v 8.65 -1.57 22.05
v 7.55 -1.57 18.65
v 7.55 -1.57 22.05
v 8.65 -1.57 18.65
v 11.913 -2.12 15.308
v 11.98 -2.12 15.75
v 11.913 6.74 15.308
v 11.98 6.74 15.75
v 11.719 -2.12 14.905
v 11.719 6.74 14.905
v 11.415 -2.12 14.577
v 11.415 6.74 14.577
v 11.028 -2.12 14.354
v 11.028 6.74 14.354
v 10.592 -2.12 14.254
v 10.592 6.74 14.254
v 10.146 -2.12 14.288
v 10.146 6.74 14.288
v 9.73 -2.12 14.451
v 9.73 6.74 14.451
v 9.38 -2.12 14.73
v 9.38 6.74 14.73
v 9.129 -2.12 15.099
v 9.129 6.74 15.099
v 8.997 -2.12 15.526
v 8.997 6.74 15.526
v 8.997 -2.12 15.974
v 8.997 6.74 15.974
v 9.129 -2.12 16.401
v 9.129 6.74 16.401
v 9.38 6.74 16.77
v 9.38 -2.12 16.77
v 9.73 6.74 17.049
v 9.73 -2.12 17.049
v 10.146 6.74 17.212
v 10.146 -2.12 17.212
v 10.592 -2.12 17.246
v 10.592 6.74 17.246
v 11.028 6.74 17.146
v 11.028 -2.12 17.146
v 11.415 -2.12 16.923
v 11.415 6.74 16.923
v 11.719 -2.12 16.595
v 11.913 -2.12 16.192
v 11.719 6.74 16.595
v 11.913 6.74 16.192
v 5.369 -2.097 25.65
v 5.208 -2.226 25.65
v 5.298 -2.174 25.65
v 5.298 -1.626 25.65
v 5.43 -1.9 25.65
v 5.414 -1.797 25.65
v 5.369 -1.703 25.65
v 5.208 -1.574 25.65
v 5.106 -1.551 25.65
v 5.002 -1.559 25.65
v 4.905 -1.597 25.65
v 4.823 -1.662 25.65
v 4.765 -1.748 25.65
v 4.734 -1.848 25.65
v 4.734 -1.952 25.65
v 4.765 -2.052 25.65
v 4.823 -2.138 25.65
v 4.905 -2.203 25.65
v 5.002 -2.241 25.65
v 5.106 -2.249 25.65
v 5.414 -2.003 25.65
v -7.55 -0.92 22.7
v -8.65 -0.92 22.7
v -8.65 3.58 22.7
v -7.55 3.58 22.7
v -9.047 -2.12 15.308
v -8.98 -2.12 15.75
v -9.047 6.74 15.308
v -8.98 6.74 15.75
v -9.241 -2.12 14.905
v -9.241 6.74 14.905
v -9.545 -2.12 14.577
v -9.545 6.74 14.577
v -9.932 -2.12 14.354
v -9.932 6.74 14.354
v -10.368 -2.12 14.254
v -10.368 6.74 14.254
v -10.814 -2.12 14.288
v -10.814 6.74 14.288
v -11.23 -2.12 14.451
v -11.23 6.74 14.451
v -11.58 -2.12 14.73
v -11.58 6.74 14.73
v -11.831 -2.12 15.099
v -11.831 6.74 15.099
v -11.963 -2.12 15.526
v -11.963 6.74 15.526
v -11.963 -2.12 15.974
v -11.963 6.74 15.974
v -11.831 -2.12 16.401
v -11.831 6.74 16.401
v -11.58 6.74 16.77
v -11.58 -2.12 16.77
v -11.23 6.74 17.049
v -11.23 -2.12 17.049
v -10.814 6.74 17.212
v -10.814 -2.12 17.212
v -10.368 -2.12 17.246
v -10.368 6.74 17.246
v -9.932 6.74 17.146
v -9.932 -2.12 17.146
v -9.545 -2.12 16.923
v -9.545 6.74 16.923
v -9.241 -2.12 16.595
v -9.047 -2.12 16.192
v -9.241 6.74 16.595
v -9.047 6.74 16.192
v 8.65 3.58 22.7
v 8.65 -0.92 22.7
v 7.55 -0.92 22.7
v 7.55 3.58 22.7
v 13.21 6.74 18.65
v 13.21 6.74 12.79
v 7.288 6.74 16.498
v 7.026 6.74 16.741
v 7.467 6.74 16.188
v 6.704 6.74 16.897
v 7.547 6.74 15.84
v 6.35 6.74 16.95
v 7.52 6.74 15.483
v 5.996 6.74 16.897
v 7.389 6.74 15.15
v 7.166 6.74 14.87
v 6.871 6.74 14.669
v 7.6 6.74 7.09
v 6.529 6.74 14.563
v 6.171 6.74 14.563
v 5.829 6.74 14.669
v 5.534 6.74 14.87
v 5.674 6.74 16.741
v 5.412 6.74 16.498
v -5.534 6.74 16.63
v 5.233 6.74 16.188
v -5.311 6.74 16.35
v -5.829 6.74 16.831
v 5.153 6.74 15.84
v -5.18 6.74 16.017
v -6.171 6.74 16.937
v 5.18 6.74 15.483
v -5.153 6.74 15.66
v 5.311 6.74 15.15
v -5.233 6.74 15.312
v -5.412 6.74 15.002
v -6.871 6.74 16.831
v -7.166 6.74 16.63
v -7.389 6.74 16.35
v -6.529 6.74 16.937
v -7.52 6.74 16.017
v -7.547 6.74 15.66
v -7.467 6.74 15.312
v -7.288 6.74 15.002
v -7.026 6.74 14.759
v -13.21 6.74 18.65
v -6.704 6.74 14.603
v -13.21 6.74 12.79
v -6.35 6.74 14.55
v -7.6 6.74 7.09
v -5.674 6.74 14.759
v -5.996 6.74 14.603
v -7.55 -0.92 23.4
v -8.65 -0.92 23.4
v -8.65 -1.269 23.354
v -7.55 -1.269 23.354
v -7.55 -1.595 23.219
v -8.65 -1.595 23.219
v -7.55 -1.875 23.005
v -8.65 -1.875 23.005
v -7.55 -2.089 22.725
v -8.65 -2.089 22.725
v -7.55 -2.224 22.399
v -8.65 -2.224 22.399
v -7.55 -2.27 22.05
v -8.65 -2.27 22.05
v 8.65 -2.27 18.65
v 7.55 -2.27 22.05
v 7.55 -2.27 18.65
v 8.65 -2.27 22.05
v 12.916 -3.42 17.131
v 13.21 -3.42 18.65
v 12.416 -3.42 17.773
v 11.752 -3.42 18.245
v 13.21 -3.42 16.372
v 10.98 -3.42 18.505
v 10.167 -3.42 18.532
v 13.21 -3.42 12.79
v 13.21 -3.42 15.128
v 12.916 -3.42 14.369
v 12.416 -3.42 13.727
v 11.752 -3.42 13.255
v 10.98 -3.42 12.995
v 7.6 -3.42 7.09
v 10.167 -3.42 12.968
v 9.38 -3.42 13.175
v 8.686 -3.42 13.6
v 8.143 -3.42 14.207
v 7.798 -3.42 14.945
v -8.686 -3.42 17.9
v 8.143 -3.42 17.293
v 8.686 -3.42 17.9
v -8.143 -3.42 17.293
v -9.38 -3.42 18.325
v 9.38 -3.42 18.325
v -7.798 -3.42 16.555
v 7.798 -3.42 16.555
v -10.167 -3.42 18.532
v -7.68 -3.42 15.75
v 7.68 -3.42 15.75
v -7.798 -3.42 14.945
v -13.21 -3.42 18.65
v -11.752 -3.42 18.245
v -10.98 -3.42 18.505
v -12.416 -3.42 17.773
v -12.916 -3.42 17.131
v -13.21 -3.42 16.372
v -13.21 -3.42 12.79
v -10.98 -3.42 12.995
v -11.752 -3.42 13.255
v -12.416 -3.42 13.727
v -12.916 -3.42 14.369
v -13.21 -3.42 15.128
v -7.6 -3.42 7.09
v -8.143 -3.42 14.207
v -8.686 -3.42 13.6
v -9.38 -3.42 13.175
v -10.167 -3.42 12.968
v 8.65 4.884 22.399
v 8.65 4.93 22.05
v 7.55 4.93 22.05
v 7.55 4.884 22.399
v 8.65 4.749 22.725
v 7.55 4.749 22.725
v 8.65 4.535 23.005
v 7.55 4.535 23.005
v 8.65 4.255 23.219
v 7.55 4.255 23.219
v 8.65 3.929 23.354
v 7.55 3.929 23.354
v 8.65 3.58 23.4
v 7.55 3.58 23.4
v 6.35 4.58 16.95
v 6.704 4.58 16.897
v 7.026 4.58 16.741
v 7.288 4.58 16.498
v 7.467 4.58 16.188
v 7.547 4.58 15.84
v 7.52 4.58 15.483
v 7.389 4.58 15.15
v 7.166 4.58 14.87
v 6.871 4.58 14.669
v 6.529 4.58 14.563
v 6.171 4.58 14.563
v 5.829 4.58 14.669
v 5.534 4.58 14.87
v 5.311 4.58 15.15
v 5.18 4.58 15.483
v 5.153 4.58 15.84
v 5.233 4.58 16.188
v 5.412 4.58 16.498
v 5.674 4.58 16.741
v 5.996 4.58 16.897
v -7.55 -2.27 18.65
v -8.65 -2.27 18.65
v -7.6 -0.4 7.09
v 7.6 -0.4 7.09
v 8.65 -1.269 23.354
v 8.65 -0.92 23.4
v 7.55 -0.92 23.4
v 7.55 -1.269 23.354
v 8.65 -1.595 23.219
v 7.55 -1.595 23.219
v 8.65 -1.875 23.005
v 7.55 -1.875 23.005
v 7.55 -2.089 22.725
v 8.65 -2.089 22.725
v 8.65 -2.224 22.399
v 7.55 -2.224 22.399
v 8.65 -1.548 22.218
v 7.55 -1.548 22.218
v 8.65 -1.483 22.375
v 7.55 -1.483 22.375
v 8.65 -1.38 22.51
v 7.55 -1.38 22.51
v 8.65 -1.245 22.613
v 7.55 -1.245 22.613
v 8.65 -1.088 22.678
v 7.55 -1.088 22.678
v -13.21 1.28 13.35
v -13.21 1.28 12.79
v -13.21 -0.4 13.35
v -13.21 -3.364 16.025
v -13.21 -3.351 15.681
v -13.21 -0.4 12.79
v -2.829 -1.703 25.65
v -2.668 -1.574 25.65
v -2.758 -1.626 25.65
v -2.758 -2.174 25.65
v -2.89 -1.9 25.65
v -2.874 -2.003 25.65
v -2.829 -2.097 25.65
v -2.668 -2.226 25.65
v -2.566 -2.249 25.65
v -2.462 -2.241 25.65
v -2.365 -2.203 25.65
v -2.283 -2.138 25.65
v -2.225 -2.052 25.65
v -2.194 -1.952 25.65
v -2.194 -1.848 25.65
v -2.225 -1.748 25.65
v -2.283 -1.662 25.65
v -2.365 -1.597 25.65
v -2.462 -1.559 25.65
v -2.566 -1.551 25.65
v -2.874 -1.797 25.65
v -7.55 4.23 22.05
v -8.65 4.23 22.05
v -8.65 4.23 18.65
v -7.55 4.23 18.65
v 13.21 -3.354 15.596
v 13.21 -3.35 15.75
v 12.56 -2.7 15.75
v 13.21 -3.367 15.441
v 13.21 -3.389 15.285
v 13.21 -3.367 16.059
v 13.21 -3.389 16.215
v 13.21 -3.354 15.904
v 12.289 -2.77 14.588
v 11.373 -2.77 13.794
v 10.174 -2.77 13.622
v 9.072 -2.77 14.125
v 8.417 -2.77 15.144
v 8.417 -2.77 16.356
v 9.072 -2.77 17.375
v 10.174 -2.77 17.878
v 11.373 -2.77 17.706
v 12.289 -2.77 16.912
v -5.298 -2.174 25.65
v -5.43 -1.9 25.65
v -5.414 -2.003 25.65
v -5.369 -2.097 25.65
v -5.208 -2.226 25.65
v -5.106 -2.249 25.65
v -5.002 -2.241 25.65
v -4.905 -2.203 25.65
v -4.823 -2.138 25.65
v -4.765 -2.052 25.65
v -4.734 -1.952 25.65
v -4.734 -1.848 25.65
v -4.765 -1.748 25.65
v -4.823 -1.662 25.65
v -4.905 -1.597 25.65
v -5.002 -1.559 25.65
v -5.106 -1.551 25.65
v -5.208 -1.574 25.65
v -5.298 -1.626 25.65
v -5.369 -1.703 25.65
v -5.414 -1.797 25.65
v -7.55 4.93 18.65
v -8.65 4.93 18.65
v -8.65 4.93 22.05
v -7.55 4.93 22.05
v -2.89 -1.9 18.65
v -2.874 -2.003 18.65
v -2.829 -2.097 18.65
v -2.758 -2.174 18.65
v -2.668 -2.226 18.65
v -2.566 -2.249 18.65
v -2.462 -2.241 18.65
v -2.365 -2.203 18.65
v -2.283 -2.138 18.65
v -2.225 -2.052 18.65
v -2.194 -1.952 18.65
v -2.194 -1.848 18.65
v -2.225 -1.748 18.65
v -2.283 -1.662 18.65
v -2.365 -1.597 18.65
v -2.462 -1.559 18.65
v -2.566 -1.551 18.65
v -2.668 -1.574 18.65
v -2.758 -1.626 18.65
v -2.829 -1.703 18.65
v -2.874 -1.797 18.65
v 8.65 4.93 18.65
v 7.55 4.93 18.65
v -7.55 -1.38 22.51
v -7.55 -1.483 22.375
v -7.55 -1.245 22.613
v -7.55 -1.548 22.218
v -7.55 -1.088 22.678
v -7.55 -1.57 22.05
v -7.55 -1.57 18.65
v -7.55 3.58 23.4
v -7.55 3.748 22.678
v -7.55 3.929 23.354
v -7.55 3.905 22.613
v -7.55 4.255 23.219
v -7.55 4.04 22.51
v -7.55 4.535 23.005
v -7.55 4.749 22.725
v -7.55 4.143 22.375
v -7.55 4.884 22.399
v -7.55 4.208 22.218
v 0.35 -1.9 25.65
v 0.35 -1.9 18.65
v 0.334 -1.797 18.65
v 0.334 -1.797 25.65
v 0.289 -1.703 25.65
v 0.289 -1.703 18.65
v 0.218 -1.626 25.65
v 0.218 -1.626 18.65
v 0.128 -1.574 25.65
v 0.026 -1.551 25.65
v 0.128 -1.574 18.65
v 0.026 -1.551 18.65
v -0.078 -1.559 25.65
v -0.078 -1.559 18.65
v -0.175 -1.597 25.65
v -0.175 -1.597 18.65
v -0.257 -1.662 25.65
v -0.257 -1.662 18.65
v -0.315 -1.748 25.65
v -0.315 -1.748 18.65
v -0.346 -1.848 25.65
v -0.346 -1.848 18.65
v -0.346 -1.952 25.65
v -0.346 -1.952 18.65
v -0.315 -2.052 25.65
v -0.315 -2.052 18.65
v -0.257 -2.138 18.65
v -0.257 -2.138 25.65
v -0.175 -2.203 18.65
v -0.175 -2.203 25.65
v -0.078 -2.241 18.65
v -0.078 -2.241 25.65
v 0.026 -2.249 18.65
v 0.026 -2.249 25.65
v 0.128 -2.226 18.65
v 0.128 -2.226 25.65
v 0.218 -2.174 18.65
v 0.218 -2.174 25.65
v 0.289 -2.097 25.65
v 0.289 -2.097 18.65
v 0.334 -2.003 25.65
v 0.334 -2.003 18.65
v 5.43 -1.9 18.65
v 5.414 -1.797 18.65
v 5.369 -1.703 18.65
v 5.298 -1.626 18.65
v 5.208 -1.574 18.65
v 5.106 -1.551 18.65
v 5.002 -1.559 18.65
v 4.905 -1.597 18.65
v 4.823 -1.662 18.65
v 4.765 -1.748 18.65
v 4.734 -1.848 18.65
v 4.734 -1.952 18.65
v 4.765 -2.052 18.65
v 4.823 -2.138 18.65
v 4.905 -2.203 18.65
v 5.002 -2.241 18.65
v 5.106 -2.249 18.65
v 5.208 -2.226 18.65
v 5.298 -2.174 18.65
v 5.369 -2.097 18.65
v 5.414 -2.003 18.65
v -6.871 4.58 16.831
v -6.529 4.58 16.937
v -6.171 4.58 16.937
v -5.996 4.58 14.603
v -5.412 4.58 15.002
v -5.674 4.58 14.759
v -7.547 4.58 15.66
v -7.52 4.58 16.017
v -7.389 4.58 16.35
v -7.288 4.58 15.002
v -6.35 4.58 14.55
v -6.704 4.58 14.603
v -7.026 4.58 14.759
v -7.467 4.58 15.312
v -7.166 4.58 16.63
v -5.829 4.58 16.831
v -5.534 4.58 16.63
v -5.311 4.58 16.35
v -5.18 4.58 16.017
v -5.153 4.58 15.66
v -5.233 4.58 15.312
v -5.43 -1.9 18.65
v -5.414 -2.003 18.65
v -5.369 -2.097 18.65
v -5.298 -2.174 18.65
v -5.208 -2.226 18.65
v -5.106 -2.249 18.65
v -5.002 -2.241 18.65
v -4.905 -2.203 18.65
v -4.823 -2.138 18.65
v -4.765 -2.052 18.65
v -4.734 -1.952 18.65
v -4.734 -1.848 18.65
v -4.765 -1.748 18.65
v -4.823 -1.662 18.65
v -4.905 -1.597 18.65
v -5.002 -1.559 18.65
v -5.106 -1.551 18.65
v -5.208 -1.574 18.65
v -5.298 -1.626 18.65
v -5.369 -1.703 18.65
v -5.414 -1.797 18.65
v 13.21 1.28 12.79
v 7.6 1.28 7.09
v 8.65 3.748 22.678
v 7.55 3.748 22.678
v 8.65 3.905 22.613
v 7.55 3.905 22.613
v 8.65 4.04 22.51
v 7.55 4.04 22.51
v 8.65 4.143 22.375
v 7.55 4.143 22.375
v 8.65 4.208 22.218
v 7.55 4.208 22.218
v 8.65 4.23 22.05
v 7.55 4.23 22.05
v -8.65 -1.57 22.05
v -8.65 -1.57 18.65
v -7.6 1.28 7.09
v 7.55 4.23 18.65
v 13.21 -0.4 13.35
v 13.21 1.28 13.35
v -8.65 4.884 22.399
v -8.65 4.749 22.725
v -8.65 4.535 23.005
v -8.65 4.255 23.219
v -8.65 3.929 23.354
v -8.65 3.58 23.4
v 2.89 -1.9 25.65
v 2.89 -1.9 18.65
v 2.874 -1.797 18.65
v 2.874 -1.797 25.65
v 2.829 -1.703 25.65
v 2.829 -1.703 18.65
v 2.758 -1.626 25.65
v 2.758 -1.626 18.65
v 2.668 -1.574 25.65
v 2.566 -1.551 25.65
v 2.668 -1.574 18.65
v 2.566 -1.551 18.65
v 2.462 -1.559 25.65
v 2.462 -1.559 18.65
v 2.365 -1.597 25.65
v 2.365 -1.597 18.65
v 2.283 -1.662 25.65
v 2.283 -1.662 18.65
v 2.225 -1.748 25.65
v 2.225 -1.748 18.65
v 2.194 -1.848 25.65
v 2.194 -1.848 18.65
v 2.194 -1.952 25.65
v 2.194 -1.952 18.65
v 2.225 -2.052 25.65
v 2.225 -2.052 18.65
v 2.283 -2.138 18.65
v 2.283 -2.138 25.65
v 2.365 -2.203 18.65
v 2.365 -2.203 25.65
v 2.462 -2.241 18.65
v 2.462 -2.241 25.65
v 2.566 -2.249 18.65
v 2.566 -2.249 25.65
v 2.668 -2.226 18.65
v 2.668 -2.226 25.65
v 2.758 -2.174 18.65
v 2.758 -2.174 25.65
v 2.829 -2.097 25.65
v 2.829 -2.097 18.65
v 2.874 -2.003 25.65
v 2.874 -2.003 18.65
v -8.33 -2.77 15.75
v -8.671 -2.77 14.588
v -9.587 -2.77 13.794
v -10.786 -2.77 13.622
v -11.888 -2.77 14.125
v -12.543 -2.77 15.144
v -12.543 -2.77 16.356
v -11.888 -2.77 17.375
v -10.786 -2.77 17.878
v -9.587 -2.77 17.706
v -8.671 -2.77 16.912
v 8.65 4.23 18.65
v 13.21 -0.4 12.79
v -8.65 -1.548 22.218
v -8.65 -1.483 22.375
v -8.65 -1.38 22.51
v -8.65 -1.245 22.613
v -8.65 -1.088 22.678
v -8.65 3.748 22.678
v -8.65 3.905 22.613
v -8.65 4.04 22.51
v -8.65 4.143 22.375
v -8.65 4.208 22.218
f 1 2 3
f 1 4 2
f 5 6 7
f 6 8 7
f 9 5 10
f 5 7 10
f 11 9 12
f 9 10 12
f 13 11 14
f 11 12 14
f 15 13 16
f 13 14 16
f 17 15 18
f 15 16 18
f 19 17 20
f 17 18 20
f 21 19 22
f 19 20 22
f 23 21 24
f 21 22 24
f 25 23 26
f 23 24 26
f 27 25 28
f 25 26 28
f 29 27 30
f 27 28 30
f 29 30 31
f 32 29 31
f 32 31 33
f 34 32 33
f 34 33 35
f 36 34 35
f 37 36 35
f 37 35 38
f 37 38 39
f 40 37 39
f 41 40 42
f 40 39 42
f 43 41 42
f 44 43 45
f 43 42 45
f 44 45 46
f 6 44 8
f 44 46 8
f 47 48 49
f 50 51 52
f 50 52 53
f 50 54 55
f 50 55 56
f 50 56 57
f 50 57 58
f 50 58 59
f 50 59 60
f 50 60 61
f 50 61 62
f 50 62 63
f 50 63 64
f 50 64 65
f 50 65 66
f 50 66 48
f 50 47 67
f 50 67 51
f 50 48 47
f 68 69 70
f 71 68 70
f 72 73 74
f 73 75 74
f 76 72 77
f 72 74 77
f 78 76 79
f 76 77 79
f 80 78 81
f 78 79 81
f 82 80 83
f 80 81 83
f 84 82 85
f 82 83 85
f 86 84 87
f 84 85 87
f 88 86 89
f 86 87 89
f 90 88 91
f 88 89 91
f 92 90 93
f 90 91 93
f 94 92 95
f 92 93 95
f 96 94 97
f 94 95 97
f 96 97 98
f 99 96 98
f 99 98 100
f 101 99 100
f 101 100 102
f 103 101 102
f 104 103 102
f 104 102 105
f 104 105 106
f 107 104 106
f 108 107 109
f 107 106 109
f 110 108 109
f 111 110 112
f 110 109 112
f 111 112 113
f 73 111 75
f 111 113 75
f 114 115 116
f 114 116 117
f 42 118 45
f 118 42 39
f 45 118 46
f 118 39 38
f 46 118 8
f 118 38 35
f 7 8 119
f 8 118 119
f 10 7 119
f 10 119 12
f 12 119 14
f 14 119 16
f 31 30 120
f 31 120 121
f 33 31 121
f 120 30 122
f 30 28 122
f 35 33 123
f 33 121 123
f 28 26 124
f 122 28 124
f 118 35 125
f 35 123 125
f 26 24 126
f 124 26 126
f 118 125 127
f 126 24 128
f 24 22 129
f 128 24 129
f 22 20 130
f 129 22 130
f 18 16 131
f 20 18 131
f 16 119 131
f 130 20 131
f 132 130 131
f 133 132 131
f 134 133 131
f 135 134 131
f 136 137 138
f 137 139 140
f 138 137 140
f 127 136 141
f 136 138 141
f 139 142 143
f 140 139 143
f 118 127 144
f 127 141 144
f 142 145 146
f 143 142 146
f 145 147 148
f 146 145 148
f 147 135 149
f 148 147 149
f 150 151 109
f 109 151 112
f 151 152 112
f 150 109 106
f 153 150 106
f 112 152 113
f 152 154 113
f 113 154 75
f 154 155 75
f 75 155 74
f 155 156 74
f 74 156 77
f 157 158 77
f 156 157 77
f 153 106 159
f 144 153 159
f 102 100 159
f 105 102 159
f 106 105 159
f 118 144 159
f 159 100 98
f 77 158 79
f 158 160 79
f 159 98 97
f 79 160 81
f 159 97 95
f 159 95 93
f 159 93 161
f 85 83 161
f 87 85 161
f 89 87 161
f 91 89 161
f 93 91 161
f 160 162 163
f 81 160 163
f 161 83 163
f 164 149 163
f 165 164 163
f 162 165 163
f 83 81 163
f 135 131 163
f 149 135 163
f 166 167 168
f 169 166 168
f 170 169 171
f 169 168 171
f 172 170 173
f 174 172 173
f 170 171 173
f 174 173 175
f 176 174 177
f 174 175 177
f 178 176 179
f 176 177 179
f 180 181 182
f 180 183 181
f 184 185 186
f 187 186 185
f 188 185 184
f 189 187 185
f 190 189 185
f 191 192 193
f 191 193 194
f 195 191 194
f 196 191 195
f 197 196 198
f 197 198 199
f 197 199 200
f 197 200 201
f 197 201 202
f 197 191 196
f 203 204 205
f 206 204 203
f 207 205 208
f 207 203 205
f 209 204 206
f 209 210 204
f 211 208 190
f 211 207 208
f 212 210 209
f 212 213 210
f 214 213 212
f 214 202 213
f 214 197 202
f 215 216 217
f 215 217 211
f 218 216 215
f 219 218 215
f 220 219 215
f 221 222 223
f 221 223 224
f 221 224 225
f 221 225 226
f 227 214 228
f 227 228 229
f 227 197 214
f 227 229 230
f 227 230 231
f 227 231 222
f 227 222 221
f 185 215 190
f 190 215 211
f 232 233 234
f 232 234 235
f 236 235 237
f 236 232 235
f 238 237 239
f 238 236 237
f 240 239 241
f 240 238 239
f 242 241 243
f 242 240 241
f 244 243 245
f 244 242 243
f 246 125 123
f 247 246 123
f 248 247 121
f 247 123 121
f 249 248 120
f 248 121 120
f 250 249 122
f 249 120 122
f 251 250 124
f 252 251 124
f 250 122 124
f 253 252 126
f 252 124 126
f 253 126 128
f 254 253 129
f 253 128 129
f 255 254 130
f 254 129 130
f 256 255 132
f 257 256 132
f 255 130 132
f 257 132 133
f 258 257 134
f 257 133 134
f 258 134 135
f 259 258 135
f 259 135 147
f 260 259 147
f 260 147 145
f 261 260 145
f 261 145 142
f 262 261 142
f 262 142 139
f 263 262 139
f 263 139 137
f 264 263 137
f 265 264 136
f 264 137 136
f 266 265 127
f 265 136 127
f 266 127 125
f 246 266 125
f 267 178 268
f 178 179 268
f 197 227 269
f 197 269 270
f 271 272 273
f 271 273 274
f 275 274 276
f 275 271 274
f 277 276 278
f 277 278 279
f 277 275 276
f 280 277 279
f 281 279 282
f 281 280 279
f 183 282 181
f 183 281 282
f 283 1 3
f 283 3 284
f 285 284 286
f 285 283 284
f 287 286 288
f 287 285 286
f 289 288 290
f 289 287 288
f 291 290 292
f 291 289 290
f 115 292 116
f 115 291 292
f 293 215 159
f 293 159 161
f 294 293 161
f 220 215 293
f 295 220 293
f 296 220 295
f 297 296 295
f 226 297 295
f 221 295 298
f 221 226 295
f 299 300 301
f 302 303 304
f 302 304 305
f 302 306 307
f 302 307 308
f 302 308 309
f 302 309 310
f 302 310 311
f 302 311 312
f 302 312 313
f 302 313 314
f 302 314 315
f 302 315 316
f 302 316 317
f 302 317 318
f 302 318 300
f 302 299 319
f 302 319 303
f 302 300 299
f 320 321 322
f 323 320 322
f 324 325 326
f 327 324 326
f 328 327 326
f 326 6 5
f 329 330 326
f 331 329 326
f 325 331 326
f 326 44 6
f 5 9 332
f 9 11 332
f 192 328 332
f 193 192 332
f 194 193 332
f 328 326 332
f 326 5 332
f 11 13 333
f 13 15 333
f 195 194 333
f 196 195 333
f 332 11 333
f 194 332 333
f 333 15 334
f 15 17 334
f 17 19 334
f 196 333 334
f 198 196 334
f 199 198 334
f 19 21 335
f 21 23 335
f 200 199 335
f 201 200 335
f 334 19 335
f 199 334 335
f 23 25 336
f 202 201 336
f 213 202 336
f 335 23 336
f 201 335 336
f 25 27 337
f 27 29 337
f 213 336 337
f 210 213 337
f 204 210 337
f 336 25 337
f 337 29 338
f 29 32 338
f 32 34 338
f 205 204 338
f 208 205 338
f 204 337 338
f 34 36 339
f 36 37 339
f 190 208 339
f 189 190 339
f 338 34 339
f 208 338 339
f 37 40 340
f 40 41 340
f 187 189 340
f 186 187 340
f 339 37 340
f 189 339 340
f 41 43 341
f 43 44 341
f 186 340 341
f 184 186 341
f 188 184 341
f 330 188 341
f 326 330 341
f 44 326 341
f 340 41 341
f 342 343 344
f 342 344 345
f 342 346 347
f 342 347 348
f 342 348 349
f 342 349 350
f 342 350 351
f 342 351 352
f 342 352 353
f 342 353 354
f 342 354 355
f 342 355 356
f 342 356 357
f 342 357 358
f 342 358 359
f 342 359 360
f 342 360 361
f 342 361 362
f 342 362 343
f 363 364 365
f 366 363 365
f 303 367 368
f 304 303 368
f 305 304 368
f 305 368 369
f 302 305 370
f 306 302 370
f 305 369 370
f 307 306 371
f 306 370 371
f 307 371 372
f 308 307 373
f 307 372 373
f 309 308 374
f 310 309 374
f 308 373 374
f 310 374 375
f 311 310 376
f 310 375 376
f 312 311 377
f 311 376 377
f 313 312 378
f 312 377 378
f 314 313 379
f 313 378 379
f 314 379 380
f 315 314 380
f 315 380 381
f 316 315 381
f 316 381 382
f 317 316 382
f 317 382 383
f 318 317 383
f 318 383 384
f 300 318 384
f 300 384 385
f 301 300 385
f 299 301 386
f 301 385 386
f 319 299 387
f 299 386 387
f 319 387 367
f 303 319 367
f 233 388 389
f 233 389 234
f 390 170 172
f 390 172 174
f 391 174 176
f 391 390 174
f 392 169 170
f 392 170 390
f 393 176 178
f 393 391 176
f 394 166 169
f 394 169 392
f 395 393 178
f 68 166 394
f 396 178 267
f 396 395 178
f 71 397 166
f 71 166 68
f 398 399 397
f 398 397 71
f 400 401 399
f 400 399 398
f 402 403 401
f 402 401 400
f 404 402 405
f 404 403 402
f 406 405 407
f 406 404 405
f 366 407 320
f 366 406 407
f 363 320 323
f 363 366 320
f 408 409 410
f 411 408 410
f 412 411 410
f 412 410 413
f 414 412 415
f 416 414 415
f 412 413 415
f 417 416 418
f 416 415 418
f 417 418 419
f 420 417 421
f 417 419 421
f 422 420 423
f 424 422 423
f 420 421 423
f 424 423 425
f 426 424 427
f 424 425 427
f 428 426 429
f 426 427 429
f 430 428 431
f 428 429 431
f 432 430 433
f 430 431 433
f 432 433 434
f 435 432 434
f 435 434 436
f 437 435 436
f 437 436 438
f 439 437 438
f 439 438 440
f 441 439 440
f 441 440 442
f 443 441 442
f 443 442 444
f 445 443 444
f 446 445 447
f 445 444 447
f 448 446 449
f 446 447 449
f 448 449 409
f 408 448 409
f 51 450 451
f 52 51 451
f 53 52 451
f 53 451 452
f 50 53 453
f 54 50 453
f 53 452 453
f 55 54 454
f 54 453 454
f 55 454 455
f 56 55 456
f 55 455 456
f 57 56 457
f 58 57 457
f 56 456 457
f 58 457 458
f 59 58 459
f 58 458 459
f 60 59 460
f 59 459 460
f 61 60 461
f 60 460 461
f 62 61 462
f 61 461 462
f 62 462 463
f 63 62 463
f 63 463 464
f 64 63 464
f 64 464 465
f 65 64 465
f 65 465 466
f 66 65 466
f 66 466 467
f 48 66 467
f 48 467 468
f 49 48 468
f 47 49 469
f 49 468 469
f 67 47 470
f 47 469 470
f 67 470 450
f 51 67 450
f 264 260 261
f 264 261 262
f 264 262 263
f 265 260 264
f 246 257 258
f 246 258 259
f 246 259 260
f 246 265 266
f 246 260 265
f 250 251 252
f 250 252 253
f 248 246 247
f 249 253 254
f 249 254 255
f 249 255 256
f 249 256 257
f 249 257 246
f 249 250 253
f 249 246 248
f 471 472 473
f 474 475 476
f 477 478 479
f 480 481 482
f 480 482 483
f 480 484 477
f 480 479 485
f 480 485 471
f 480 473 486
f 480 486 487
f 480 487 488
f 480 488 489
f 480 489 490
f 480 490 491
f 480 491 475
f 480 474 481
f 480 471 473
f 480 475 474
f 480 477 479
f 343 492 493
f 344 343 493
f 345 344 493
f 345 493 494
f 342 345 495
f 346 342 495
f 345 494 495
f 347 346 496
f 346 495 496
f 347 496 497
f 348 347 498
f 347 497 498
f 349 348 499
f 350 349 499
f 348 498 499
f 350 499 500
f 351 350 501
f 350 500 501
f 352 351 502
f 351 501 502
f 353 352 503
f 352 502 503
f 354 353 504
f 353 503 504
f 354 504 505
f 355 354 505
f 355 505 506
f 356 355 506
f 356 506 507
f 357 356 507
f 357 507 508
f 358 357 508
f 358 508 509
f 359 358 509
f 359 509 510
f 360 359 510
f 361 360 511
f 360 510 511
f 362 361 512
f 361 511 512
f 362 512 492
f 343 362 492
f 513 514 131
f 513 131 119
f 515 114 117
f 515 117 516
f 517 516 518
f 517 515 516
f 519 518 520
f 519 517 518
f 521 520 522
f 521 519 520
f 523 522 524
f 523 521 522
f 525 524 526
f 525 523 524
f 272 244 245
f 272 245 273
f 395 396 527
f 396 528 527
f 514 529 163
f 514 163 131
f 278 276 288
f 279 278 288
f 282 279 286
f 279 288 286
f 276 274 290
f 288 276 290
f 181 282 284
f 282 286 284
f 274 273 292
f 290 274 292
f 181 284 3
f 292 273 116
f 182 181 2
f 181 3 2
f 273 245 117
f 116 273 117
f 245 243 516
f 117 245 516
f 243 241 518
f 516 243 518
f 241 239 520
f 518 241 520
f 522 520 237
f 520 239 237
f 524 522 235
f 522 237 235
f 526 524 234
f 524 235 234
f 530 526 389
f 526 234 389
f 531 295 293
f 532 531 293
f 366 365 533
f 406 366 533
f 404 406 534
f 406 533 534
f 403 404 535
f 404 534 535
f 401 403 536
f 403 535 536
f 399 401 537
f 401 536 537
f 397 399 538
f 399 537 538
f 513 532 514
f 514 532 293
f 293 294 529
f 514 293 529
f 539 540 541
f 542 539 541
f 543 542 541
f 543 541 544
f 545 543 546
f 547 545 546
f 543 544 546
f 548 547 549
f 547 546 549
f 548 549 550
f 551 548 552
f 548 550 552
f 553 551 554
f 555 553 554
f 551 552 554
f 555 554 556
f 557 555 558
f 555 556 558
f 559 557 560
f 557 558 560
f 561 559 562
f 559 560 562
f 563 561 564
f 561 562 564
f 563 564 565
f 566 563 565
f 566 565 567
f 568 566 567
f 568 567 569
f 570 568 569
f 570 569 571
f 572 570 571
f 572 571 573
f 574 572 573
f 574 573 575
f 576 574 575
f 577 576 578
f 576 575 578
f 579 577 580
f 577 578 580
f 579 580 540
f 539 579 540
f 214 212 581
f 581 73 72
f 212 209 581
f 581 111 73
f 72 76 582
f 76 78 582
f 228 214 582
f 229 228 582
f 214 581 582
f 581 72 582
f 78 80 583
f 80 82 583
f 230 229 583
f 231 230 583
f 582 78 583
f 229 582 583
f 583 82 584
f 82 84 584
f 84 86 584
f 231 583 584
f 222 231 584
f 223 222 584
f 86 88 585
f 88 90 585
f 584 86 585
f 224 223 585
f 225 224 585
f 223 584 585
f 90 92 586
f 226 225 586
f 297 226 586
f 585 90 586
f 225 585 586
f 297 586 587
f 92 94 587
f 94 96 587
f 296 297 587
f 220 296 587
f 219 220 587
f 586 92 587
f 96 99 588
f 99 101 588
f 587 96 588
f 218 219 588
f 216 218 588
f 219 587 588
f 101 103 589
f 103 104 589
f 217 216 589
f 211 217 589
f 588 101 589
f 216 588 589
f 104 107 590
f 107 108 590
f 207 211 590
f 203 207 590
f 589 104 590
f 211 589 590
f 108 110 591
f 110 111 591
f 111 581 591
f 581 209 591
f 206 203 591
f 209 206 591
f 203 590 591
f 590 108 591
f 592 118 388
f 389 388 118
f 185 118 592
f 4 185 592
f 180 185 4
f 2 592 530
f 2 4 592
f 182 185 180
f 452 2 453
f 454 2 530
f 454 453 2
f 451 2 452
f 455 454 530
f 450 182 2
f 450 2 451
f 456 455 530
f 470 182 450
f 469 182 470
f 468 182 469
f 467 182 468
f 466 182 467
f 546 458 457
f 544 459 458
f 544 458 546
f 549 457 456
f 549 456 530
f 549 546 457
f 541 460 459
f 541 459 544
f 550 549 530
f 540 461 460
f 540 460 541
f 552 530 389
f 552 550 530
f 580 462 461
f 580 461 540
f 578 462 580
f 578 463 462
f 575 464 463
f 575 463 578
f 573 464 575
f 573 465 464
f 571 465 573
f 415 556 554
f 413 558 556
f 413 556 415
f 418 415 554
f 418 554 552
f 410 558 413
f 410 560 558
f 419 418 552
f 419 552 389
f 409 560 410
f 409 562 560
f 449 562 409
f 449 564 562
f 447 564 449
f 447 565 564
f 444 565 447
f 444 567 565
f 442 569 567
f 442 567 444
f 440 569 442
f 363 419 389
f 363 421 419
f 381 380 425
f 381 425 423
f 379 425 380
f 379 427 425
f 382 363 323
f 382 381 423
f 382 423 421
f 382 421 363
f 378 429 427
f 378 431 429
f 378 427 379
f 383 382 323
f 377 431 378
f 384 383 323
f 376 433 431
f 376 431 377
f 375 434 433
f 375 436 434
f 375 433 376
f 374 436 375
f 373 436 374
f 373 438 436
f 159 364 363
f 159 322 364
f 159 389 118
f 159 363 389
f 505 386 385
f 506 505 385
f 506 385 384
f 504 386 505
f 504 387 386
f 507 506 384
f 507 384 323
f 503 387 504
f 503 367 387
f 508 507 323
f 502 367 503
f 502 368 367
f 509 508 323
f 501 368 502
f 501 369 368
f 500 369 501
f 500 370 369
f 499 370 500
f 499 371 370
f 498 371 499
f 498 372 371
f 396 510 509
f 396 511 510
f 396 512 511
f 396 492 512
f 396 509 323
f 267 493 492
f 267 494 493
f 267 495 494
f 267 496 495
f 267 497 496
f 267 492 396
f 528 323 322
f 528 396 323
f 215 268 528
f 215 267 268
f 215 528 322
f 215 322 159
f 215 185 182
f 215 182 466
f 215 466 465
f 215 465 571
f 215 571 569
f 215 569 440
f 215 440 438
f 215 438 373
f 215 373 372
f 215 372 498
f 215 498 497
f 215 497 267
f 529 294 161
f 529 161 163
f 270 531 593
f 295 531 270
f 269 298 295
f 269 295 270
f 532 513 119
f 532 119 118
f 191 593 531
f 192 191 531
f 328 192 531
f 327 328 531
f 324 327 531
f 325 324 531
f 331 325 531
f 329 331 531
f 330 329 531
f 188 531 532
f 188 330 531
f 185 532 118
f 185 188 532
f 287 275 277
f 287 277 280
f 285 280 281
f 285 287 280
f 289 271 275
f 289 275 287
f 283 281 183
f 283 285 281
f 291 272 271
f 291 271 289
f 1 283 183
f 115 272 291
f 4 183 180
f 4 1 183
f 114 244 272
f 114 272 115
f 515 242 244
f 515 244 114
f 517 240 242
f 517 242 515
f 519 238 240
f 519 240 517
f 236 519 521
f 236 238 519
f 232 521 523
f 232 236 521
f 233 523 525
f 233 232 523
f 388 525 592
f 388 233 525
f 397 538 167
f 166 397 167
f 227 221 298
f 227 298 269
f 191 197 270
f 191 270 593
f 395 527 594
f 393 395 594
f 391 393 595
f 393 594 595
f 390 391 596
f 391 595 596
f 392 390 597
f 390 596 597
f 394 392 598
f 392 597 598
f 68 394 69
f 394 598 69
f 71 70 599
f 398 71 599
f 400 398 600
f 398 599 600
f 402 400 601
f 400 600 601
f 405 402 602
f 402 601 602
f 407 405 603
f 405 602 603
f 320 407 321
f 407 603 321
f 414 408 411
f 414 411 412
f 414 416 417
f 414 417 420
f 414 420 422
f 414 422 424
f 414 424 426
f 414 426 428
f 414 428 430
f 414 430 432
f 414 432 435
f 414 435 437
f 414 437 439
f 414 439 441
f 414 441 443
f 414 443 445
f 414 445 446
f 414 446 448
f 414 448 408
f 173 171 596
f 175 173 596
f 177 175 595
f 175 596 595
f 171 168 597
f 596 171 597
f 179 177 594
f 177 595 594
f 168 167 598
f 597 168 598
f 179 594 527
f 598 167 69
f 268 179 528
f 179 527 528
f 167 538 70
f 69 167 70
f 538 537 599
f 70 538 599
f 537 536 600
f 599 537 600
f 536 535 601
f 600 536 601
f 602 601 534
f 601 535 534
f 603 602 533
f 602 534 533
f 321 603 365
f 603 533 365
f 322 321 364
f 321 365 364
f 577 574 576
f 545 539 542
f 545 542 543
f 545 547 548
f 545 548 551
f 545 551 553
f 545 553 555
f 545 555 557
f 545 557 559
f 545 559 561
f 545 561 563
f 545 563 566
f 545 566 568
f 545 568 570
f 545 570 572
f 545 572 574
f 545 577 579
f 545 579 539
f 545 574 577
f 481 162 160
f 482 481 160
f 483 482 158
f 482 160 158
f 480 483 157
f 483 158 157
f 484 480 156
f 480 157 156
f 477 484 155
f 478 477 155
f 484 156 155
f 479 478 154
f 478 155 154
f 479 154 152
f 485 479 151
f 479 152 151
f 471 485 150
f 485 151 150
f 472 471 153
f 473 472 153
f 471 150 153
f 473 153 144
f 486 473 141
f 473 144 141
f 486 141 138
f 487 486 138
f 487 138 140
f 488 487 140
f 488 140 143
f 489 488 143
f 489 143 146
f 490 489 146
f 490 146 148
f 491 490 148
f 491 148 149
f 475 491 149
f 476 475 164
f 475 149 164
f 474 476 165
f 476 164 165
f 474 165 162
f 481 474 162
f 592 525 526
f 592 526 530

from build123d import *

# Parameters (mm, degrees)
AUFSATZ_LINEAR_AUSTRAGEN1_DEPTH                      = 6.74
AUFSATZ_LINEAR_AUSTRAGEN1_DEPTH_BACK                 = 3.42
SKIZZE1_R                                            = 1.385
SCHNITT_LINEAR_AUSTRAGEN1_DEPTH                      = 24.827593248
SCHNITT_LINEAR_AUSTRAGEN1_DEPTH_BACK                 = 24.827593248
SKIZZE2_W                                            = 16.035180953
SKIZZE2_H                                            = 1.68
SKIZZE3_R                                            = 1.2
SCHNITT_LINEAR_AUSTRAGEN2_DEPTH                      = 2.16
SKIZZE4_R                                            = 0.35
AUFSATZ_LINEAR_AUSTRAGEN2_DEPTH                      = 7
LINEAR_AUSTRAGEN_D_NN1_DEPTH                         = 0.55
FORMSENKUNG_F_R_M3_SENKSCHRAUBE_MIT_SCHL_D           = 3
FORMSENKUNG_F_R_M3_SENKSCHRAUBE_MIT_SCHL_DEPTH       = 11
FORMSENKUNG_F_R_M3_SENKSCHRAUBE_MIT_SCHL_CSINK_D     = 5.6
FORMSENKUNG_F_R_M3_SENKSCHRAUBE_MIT_SCHL_CSINK_ANGLE = 90
FORMSENKUNG_F_R_M3_SENKSCHRAUBE_MIT_SCHL_TIP         = 0.901290929


with BuildPart() as part:
    # Skizze1 → Aufsatz-Linear austragen1 (new, two sides: drawn at the far end of the back side and taken through both)
    with BuildSketch(Plane(origin=(0, 0, 0), x_dir=(1, 0, 0), z_dir=(0, 1, 0)).offset(-AUFSATZ_LINEAR_AUSTRAGEN1_DEPTH_BACK)):
        Polygon((-13.21, -18.65), (-13.21, -12.79), (-7.6, -7.09), (7.6, -7.09), (13.21, -12.79), (13.21, -18.65), align=None)
        with Locations((-10.48, -15.75)):
            Circle(SKIZZE1_R, mode=Mode.SUBTRACT)
        with Locations((10.48, -15.75)):
            Circle(SKIZZE1_R, mode=Mode.SUBTRACT)
    extrude(amount=AUFSATZ_LINEAR_AUSTRAGEN1_DEPTH + AUFSATZ_LINEAR_AUSTRAGEN1_DEPTH_BACK)

    # Skizze2 → Schnitt-Linear austragen1 (cut, two sides: drawn at the far end of the back side and taken through both)
    with BuildSketch(Plane(origin=(0, 0, 0), x_dir=(0, 0, -1), z_dir=(1, 0, 0)).offset(-SCHNITT_LINEAR_AUSTRAGEN1_DEPTH_BACK)):
        with Locations((-5.332409524, 0.44)):
            Rectangle(SKIZZE2_W, SKIZZE2_H)
    extrude(amount=SCHNITT_LINEAR_AUSTRAGEN1_DEPTH + SCHNITT_LINEAR_AUSTRAGEN1_DEPTH_BACK, mode=Mode.SUBTRACT)

    # Skizze3 → Schnitt-Linear austragen2 (cut)
    with BuildSketch(Plane(origin=(0, 6.74, 0), x_dir=(1, 0, 0), z_dir=(0, 1, 0))):
        with Locations((6.35, -15.75)):
            Circle(SKIZZE3_R)
        with Locations((-6.35, -15.75)):
            Circle(SKIZZE3_R)
    extrude(amount=-SCHNITT_LINEAR_AUSTRAGEN2_DEPTH, mode=Mode.SUBTRACT)

    # Skizze4 → Aufsatz-Linear austragen2 (add)
    with BuildSketch(Plane.XY.offset(18.65)):
        with Locations((0, -1.9)):
            Circle(SKIZZE4_R)
        with Locations((2.54, -1.9)):
            Circle(SKIZZE4_R)
        with Locations((5.08, -1.9)):
            Circle(SKIZZE4_R)
        with Locations((-2.54, -1.9)):
            Circle(SKIZZE4_R)
        with Locations((-5.08, -1.9)):
            Circle(SKIZZE4_R)
    extrude(amount=AUFSATZ_LINEAR_AUSTRAGEN2_DEPTH)

    # Skizze5 → Linear-Austragen-Dünn1 (add, symmetric)
    with BuildSketch(Plane(origin=(8.1, 0, 0), x_dir=(0, 0, -1), z_dir=(1, 0, 0))):
        with BuildLine():
            Line((-18.65, -1.57), (-22.05, -1.57))
            ThreePointArc((-22.05, -1.57), (-22.509619408, -1.379619408), (-22.7, -0.92))
            Line((-22.7, -0.92), (-22.7, 3.58))
            ThreePointArc((-22.7, 3.58), (-22.509619408, 4.039619408), (-22.05, 4.23))
            Line((-22.05, 4.23), (-18.65, 4.23))
            Line((-18.65, 4.23), (-18.65, 4.93))
            Line((-18.65, 4.93), (-22.05, 4.93))
            ThreePointArc((-22.05, 4.93), (-23.004594155, 4.534594155), (-23.4, 3.58))
            Line((-23.4, 3.58), (-23.4, -0.92))
            ThreePointArc((-23.4, -0.92), (-23.004594155, -1.874594155), (-22.05, -2.27))
            Line((-22.05, -2.27), (-18.65, -2.27))
            Line((-18.65, -2.27), (-18.65, -1.57))
        make_face()
    linear_austragen_d_nn1 = extrude(amount=LINEAR_AUSTRAGEN_D_NN1_DEPTH, both=True)

    # Spiegeln1: Linear-Austragen-Dünn1 across plane
    add(linear_austragen_d_nn1.mirror(Plane(origin=(0, 0, 0), x_dir=(0, 0, 1), z_dir=(1, 0, 0))))

    # Formsenkung für M3 Senkschraube mit Schlitz/Kreuzschlitz1
    with Locations(Plane(origin=(0, -3.42, 0), x_dir=(-1, 0, 0), z_dir=(0, -1, 0))):
        with Locations((-10.48, -15.75), (10.48, -15.75)):
            CounterSinkHole(FORMSENKUNG_F_R_M3_SENKSCHRAUBE_MIT_SCHL_D / 2, FORMSENKUNG_F_R_M3_SENKSCHRAUBE_MIT_SCHL_CSINK_D / 2, depth=FORMSENKUNG_F_R_M3_SENKSCHRAUBE_MIT_SCHL_DEPTH, counter_sink_angle=FORMSENKUNG_F_R_M3_SENKSCHRAUBE_MIT_SCHL_CSINK_ANGLE)
            with Locations((0, 0, -(FORMSENKUNG_F_R_M3_SENKSCHRAUBE_MIT_SCHL_DEPTH + FORMSENKUNG_F_R_M3_SENKSCHRAUBE_MIT_SCHL_TIP / 2))):  # 118° drill point
                Cone(0, FORMSENKUNG_F_R_M3_SENKSCHRAUBE_MIT_SCHL_D / 2, FORMSENKUNG_F_R_M3_SENKSCHRAUBE_MIT_SCHL_TIP, mode=Mode.SUBTRACT)


solid = part.part
